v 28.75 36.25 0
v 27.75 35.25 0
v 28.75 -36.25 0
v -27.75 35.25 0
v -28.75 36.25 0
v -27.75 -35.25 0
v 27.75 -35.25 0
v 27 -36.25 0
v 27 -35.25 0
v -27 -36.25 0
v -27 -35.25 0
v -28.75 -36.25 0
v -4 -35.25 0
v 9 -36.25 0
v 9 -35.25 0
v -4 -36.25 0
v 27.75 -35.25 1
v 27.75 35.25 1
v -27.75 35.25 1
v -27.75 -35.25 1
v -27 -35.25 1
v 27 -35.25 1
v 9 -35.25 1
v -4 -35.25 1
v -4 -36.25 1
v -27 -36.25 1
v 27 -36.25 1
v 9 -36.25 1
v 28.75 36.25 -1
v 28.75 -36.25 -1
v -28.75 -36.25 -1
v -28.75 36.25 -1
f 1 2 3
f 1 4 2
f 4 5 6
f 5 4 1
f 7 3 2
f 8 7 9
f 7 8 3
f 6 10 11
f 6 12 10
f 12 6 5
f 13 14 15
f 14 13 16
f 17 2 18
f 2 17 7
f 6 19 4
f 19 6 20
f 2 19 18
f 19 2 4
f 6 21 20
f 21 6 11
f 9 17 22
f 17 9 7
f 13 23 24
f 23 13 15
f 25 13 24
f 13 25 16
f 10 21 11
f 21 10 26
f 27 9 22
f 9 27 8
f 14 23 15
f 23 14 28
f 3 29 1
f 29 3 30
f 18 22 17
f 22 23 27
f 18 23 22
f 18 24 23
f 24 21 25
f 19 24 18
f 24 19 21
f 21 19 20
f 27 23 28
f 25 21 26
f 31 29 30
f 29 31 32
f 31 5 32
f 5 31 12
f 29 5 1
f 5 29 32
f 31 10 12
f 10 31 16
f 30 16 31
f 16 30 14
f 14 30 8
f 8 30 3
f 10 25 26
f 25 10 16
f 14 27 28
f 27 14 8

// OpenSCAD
servo_y_dim = 20;
servo_x_dim = 55;
servo_z_dim = 40;

clearance = 1.5;

wall_thickness = 2;

arduino_x_dim = 54;
arduino_y_dim = 69;
arduino_z_dim = 30;

arduino_tab_y_dim = 10;
arduino_tab_x_dim = 1;
arduino_tab_z_dim = 7;

//tab centered on arduino
arduino_tab_y_center = 30;

//Main base
difference(){
cube([
    arduino_x_dim + clearance + wall_thickness,
    arduino_y_dim + clearance + wall_thickness,
    2
],center=true);


translate([0,0,30])
difference(){
//Arduino Walls
translate([0,0,-arduino_z_dim/2])
    cube([
        arduino_x_dim + clearance + wall_thickness+1,
        arduino_y_dim + clearance + wall_thickness+1,
        arduino_z_dim

    ],center=true);
    
    translate([0,0,-(arduino_z_dim)/2-.03])
    cube([
        arduino_x_dim + clearance,
        arduino_y_dim + clearance,
        arduino_z_dim+.03
    ],center=true);
    
  
    //Slots for arduino USB and Power
     translate([
        -(arduino_x_dim/2 - 23/2),
        -arduino_y_dim/2,
        -arduino_z_dim - .01 + arduino_tab_z_dim/2])
    cube([
        23,
        10,
        arduino_tab_z_dim
    ],center=true);

    translate([
        (arduino_x_dim/2 - 18/2),
        -arduino_y_dim/2,
        -arduino_z_dim - .01 + arduino_tab_z_dim/2])
    cube([
        18,
        10,
        arduino_tab_z_dim
    ],center=true);

}
}
